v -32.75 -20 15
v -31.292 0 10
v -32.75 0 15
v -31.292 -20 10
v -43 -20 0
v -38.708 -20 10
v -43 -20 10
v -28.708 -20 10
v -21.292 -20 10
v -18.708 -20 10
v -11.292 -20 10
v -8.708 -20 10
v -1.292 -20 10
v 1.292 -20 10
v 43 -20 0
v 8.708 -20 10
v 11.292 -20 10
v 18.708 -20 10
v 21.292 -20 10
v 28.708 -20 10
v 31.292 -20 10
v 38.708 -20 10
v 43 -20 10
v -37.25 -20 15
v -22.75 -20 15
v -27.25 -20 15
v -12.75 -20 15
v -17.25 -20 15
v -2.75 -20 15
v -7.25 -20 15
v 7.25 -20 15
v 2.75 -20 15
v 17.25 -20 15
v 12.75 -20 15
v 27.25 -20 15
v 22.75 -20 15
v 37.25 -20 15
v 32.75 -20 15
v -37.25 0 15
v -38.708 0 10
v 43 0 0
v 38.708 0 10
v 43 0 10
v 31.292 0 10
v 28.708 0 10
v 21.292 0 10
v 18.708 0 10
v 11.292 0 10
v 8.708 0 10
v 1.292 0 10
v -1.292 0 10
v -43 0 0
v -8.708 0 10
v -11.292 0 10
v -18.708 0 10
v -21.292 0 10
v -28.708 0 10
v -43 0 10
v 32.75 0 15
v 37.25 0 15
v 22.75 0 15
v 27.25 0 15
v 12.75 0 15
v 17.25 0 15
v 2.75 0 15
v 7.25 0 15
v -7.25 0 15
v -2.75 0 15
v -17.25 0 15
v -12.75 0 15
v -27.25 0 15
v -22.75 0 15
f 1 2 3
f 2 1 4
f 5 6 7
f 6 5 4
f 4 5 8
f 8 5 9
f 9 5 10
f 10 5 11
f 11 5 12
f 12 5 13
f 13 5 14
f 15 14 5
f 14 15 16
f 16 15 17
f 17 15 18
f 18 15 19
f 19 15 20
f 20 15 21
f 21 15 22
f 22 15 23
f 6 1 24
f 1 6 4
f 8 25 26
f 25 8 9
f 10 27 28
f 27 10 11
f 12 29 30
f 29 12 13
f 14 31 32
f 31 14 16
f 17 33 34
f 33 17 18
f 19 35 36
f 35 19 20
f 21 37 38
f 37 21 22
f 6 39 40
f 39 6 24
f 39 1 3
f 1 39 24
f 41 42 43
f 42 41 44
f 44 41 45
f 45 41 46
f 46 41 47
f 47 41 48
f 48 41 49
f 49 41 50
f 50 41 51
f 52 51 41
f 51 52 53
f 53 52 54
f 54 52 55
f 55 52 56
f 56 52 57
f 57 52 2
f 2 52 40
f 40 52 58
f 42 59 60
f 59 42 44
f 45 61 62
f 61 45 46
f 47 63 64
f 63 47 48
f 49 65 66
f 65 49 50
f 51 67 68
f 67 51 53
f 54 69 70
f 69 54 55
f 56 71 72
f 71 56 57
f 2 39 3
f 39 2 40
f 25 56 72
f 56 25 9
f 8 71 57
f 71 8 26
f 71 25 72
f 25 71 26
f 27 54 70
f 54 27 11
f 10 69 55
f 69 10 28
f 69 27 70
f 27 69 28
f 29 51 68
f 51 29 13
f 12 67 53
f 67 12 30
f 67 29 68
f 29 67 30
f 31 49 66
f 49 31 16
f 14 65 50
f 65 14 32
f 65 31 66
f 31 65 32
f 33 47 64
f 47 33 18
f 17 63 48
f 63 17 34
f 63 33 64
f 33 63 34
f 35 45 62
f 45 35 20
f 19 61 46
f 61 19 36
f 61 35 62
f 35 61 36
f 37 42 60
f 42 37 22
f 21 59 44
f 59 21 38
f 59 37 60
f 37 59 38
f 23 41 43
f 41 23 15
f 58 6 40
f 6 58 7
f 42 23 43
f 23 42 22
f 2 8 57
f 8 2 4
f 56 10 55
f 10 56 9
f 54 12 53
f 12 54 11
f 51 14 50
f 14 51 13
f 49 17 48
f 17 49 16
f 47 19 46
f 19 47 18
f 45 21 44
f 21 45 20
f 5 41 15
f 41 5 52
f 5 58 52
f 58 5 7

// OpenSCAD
$fn = 32;

// ----------------------------------------------------------------------
// Toothed rack, 8 teeth
// 10 mm pitch, 5 mm teeth
// ----------------------------------------------------------------------

// --- parameters (mm) ---
bar_w = 20;     // bar width (Y)
bar_h = 10;     // bar height (Z)
teeth = 8;      // number of teeth
pitch = 10;     // tooth pitch
tooth_h = 5;    // tooth height above the bar
root_w = 8;     // tooth width at the root
crest_w = 4.5;  // tooth width at the crest

// --- derived feature positions (mm) ---
span = (teeth - 1) * pitch;  // = 70   distance between the outer teeth
bar_l = span + root_w + 8;   // = 86   bar length: teeth plus 4 mm at each end
tooth_x = -span / 2;         // = -35   X of the first tooth
height = bar_h + tooth_h;    // = 15   overall height
feature_centers = [
  [tooth_x + 0 * pitch, -bar_w / 2],
  [tooth_x + 1 * pitch, -bar_w / 2],
  [tooth_x + 2 * pitch, -bar_w / 2],
  [tooth_x + 3 * pitch, -bar_w / 2],
  [tooth_x + 4 * pitch, -bar_w / 2],
  [tooth_x + 5 * pitch, -bar_w / 2],
  [tooth_x + 6 * pitch, -bar_w / 2],
  [tooth_x + 7 * pitch, -bar_w / 2]
];   // tooth centre line, drives the tooth loop

// bar with a rack of teeth, one extruded trapezoium per centre
module rack_tooth() {
  linear_extrude(height = bar_w)
    polygon(points = [
      [0, 0],
      [root_w, 0],
      [root_w / 2 + crest_w / 2, tooth_h + 1],
      [root_w / 2 - crest_w / 2, tooth_h + 1]
    ]);
}

union() {
  translate([-bar_l / 2, -bar_w, 0]) cube([bar_l, bar_w, bar_h]);
  for (centre = feature_centers)
    translate([centre[0] - root_w / 2, 0, bar_h - 1]) rotate([90, 0, 0]) rack_tooth();
}
